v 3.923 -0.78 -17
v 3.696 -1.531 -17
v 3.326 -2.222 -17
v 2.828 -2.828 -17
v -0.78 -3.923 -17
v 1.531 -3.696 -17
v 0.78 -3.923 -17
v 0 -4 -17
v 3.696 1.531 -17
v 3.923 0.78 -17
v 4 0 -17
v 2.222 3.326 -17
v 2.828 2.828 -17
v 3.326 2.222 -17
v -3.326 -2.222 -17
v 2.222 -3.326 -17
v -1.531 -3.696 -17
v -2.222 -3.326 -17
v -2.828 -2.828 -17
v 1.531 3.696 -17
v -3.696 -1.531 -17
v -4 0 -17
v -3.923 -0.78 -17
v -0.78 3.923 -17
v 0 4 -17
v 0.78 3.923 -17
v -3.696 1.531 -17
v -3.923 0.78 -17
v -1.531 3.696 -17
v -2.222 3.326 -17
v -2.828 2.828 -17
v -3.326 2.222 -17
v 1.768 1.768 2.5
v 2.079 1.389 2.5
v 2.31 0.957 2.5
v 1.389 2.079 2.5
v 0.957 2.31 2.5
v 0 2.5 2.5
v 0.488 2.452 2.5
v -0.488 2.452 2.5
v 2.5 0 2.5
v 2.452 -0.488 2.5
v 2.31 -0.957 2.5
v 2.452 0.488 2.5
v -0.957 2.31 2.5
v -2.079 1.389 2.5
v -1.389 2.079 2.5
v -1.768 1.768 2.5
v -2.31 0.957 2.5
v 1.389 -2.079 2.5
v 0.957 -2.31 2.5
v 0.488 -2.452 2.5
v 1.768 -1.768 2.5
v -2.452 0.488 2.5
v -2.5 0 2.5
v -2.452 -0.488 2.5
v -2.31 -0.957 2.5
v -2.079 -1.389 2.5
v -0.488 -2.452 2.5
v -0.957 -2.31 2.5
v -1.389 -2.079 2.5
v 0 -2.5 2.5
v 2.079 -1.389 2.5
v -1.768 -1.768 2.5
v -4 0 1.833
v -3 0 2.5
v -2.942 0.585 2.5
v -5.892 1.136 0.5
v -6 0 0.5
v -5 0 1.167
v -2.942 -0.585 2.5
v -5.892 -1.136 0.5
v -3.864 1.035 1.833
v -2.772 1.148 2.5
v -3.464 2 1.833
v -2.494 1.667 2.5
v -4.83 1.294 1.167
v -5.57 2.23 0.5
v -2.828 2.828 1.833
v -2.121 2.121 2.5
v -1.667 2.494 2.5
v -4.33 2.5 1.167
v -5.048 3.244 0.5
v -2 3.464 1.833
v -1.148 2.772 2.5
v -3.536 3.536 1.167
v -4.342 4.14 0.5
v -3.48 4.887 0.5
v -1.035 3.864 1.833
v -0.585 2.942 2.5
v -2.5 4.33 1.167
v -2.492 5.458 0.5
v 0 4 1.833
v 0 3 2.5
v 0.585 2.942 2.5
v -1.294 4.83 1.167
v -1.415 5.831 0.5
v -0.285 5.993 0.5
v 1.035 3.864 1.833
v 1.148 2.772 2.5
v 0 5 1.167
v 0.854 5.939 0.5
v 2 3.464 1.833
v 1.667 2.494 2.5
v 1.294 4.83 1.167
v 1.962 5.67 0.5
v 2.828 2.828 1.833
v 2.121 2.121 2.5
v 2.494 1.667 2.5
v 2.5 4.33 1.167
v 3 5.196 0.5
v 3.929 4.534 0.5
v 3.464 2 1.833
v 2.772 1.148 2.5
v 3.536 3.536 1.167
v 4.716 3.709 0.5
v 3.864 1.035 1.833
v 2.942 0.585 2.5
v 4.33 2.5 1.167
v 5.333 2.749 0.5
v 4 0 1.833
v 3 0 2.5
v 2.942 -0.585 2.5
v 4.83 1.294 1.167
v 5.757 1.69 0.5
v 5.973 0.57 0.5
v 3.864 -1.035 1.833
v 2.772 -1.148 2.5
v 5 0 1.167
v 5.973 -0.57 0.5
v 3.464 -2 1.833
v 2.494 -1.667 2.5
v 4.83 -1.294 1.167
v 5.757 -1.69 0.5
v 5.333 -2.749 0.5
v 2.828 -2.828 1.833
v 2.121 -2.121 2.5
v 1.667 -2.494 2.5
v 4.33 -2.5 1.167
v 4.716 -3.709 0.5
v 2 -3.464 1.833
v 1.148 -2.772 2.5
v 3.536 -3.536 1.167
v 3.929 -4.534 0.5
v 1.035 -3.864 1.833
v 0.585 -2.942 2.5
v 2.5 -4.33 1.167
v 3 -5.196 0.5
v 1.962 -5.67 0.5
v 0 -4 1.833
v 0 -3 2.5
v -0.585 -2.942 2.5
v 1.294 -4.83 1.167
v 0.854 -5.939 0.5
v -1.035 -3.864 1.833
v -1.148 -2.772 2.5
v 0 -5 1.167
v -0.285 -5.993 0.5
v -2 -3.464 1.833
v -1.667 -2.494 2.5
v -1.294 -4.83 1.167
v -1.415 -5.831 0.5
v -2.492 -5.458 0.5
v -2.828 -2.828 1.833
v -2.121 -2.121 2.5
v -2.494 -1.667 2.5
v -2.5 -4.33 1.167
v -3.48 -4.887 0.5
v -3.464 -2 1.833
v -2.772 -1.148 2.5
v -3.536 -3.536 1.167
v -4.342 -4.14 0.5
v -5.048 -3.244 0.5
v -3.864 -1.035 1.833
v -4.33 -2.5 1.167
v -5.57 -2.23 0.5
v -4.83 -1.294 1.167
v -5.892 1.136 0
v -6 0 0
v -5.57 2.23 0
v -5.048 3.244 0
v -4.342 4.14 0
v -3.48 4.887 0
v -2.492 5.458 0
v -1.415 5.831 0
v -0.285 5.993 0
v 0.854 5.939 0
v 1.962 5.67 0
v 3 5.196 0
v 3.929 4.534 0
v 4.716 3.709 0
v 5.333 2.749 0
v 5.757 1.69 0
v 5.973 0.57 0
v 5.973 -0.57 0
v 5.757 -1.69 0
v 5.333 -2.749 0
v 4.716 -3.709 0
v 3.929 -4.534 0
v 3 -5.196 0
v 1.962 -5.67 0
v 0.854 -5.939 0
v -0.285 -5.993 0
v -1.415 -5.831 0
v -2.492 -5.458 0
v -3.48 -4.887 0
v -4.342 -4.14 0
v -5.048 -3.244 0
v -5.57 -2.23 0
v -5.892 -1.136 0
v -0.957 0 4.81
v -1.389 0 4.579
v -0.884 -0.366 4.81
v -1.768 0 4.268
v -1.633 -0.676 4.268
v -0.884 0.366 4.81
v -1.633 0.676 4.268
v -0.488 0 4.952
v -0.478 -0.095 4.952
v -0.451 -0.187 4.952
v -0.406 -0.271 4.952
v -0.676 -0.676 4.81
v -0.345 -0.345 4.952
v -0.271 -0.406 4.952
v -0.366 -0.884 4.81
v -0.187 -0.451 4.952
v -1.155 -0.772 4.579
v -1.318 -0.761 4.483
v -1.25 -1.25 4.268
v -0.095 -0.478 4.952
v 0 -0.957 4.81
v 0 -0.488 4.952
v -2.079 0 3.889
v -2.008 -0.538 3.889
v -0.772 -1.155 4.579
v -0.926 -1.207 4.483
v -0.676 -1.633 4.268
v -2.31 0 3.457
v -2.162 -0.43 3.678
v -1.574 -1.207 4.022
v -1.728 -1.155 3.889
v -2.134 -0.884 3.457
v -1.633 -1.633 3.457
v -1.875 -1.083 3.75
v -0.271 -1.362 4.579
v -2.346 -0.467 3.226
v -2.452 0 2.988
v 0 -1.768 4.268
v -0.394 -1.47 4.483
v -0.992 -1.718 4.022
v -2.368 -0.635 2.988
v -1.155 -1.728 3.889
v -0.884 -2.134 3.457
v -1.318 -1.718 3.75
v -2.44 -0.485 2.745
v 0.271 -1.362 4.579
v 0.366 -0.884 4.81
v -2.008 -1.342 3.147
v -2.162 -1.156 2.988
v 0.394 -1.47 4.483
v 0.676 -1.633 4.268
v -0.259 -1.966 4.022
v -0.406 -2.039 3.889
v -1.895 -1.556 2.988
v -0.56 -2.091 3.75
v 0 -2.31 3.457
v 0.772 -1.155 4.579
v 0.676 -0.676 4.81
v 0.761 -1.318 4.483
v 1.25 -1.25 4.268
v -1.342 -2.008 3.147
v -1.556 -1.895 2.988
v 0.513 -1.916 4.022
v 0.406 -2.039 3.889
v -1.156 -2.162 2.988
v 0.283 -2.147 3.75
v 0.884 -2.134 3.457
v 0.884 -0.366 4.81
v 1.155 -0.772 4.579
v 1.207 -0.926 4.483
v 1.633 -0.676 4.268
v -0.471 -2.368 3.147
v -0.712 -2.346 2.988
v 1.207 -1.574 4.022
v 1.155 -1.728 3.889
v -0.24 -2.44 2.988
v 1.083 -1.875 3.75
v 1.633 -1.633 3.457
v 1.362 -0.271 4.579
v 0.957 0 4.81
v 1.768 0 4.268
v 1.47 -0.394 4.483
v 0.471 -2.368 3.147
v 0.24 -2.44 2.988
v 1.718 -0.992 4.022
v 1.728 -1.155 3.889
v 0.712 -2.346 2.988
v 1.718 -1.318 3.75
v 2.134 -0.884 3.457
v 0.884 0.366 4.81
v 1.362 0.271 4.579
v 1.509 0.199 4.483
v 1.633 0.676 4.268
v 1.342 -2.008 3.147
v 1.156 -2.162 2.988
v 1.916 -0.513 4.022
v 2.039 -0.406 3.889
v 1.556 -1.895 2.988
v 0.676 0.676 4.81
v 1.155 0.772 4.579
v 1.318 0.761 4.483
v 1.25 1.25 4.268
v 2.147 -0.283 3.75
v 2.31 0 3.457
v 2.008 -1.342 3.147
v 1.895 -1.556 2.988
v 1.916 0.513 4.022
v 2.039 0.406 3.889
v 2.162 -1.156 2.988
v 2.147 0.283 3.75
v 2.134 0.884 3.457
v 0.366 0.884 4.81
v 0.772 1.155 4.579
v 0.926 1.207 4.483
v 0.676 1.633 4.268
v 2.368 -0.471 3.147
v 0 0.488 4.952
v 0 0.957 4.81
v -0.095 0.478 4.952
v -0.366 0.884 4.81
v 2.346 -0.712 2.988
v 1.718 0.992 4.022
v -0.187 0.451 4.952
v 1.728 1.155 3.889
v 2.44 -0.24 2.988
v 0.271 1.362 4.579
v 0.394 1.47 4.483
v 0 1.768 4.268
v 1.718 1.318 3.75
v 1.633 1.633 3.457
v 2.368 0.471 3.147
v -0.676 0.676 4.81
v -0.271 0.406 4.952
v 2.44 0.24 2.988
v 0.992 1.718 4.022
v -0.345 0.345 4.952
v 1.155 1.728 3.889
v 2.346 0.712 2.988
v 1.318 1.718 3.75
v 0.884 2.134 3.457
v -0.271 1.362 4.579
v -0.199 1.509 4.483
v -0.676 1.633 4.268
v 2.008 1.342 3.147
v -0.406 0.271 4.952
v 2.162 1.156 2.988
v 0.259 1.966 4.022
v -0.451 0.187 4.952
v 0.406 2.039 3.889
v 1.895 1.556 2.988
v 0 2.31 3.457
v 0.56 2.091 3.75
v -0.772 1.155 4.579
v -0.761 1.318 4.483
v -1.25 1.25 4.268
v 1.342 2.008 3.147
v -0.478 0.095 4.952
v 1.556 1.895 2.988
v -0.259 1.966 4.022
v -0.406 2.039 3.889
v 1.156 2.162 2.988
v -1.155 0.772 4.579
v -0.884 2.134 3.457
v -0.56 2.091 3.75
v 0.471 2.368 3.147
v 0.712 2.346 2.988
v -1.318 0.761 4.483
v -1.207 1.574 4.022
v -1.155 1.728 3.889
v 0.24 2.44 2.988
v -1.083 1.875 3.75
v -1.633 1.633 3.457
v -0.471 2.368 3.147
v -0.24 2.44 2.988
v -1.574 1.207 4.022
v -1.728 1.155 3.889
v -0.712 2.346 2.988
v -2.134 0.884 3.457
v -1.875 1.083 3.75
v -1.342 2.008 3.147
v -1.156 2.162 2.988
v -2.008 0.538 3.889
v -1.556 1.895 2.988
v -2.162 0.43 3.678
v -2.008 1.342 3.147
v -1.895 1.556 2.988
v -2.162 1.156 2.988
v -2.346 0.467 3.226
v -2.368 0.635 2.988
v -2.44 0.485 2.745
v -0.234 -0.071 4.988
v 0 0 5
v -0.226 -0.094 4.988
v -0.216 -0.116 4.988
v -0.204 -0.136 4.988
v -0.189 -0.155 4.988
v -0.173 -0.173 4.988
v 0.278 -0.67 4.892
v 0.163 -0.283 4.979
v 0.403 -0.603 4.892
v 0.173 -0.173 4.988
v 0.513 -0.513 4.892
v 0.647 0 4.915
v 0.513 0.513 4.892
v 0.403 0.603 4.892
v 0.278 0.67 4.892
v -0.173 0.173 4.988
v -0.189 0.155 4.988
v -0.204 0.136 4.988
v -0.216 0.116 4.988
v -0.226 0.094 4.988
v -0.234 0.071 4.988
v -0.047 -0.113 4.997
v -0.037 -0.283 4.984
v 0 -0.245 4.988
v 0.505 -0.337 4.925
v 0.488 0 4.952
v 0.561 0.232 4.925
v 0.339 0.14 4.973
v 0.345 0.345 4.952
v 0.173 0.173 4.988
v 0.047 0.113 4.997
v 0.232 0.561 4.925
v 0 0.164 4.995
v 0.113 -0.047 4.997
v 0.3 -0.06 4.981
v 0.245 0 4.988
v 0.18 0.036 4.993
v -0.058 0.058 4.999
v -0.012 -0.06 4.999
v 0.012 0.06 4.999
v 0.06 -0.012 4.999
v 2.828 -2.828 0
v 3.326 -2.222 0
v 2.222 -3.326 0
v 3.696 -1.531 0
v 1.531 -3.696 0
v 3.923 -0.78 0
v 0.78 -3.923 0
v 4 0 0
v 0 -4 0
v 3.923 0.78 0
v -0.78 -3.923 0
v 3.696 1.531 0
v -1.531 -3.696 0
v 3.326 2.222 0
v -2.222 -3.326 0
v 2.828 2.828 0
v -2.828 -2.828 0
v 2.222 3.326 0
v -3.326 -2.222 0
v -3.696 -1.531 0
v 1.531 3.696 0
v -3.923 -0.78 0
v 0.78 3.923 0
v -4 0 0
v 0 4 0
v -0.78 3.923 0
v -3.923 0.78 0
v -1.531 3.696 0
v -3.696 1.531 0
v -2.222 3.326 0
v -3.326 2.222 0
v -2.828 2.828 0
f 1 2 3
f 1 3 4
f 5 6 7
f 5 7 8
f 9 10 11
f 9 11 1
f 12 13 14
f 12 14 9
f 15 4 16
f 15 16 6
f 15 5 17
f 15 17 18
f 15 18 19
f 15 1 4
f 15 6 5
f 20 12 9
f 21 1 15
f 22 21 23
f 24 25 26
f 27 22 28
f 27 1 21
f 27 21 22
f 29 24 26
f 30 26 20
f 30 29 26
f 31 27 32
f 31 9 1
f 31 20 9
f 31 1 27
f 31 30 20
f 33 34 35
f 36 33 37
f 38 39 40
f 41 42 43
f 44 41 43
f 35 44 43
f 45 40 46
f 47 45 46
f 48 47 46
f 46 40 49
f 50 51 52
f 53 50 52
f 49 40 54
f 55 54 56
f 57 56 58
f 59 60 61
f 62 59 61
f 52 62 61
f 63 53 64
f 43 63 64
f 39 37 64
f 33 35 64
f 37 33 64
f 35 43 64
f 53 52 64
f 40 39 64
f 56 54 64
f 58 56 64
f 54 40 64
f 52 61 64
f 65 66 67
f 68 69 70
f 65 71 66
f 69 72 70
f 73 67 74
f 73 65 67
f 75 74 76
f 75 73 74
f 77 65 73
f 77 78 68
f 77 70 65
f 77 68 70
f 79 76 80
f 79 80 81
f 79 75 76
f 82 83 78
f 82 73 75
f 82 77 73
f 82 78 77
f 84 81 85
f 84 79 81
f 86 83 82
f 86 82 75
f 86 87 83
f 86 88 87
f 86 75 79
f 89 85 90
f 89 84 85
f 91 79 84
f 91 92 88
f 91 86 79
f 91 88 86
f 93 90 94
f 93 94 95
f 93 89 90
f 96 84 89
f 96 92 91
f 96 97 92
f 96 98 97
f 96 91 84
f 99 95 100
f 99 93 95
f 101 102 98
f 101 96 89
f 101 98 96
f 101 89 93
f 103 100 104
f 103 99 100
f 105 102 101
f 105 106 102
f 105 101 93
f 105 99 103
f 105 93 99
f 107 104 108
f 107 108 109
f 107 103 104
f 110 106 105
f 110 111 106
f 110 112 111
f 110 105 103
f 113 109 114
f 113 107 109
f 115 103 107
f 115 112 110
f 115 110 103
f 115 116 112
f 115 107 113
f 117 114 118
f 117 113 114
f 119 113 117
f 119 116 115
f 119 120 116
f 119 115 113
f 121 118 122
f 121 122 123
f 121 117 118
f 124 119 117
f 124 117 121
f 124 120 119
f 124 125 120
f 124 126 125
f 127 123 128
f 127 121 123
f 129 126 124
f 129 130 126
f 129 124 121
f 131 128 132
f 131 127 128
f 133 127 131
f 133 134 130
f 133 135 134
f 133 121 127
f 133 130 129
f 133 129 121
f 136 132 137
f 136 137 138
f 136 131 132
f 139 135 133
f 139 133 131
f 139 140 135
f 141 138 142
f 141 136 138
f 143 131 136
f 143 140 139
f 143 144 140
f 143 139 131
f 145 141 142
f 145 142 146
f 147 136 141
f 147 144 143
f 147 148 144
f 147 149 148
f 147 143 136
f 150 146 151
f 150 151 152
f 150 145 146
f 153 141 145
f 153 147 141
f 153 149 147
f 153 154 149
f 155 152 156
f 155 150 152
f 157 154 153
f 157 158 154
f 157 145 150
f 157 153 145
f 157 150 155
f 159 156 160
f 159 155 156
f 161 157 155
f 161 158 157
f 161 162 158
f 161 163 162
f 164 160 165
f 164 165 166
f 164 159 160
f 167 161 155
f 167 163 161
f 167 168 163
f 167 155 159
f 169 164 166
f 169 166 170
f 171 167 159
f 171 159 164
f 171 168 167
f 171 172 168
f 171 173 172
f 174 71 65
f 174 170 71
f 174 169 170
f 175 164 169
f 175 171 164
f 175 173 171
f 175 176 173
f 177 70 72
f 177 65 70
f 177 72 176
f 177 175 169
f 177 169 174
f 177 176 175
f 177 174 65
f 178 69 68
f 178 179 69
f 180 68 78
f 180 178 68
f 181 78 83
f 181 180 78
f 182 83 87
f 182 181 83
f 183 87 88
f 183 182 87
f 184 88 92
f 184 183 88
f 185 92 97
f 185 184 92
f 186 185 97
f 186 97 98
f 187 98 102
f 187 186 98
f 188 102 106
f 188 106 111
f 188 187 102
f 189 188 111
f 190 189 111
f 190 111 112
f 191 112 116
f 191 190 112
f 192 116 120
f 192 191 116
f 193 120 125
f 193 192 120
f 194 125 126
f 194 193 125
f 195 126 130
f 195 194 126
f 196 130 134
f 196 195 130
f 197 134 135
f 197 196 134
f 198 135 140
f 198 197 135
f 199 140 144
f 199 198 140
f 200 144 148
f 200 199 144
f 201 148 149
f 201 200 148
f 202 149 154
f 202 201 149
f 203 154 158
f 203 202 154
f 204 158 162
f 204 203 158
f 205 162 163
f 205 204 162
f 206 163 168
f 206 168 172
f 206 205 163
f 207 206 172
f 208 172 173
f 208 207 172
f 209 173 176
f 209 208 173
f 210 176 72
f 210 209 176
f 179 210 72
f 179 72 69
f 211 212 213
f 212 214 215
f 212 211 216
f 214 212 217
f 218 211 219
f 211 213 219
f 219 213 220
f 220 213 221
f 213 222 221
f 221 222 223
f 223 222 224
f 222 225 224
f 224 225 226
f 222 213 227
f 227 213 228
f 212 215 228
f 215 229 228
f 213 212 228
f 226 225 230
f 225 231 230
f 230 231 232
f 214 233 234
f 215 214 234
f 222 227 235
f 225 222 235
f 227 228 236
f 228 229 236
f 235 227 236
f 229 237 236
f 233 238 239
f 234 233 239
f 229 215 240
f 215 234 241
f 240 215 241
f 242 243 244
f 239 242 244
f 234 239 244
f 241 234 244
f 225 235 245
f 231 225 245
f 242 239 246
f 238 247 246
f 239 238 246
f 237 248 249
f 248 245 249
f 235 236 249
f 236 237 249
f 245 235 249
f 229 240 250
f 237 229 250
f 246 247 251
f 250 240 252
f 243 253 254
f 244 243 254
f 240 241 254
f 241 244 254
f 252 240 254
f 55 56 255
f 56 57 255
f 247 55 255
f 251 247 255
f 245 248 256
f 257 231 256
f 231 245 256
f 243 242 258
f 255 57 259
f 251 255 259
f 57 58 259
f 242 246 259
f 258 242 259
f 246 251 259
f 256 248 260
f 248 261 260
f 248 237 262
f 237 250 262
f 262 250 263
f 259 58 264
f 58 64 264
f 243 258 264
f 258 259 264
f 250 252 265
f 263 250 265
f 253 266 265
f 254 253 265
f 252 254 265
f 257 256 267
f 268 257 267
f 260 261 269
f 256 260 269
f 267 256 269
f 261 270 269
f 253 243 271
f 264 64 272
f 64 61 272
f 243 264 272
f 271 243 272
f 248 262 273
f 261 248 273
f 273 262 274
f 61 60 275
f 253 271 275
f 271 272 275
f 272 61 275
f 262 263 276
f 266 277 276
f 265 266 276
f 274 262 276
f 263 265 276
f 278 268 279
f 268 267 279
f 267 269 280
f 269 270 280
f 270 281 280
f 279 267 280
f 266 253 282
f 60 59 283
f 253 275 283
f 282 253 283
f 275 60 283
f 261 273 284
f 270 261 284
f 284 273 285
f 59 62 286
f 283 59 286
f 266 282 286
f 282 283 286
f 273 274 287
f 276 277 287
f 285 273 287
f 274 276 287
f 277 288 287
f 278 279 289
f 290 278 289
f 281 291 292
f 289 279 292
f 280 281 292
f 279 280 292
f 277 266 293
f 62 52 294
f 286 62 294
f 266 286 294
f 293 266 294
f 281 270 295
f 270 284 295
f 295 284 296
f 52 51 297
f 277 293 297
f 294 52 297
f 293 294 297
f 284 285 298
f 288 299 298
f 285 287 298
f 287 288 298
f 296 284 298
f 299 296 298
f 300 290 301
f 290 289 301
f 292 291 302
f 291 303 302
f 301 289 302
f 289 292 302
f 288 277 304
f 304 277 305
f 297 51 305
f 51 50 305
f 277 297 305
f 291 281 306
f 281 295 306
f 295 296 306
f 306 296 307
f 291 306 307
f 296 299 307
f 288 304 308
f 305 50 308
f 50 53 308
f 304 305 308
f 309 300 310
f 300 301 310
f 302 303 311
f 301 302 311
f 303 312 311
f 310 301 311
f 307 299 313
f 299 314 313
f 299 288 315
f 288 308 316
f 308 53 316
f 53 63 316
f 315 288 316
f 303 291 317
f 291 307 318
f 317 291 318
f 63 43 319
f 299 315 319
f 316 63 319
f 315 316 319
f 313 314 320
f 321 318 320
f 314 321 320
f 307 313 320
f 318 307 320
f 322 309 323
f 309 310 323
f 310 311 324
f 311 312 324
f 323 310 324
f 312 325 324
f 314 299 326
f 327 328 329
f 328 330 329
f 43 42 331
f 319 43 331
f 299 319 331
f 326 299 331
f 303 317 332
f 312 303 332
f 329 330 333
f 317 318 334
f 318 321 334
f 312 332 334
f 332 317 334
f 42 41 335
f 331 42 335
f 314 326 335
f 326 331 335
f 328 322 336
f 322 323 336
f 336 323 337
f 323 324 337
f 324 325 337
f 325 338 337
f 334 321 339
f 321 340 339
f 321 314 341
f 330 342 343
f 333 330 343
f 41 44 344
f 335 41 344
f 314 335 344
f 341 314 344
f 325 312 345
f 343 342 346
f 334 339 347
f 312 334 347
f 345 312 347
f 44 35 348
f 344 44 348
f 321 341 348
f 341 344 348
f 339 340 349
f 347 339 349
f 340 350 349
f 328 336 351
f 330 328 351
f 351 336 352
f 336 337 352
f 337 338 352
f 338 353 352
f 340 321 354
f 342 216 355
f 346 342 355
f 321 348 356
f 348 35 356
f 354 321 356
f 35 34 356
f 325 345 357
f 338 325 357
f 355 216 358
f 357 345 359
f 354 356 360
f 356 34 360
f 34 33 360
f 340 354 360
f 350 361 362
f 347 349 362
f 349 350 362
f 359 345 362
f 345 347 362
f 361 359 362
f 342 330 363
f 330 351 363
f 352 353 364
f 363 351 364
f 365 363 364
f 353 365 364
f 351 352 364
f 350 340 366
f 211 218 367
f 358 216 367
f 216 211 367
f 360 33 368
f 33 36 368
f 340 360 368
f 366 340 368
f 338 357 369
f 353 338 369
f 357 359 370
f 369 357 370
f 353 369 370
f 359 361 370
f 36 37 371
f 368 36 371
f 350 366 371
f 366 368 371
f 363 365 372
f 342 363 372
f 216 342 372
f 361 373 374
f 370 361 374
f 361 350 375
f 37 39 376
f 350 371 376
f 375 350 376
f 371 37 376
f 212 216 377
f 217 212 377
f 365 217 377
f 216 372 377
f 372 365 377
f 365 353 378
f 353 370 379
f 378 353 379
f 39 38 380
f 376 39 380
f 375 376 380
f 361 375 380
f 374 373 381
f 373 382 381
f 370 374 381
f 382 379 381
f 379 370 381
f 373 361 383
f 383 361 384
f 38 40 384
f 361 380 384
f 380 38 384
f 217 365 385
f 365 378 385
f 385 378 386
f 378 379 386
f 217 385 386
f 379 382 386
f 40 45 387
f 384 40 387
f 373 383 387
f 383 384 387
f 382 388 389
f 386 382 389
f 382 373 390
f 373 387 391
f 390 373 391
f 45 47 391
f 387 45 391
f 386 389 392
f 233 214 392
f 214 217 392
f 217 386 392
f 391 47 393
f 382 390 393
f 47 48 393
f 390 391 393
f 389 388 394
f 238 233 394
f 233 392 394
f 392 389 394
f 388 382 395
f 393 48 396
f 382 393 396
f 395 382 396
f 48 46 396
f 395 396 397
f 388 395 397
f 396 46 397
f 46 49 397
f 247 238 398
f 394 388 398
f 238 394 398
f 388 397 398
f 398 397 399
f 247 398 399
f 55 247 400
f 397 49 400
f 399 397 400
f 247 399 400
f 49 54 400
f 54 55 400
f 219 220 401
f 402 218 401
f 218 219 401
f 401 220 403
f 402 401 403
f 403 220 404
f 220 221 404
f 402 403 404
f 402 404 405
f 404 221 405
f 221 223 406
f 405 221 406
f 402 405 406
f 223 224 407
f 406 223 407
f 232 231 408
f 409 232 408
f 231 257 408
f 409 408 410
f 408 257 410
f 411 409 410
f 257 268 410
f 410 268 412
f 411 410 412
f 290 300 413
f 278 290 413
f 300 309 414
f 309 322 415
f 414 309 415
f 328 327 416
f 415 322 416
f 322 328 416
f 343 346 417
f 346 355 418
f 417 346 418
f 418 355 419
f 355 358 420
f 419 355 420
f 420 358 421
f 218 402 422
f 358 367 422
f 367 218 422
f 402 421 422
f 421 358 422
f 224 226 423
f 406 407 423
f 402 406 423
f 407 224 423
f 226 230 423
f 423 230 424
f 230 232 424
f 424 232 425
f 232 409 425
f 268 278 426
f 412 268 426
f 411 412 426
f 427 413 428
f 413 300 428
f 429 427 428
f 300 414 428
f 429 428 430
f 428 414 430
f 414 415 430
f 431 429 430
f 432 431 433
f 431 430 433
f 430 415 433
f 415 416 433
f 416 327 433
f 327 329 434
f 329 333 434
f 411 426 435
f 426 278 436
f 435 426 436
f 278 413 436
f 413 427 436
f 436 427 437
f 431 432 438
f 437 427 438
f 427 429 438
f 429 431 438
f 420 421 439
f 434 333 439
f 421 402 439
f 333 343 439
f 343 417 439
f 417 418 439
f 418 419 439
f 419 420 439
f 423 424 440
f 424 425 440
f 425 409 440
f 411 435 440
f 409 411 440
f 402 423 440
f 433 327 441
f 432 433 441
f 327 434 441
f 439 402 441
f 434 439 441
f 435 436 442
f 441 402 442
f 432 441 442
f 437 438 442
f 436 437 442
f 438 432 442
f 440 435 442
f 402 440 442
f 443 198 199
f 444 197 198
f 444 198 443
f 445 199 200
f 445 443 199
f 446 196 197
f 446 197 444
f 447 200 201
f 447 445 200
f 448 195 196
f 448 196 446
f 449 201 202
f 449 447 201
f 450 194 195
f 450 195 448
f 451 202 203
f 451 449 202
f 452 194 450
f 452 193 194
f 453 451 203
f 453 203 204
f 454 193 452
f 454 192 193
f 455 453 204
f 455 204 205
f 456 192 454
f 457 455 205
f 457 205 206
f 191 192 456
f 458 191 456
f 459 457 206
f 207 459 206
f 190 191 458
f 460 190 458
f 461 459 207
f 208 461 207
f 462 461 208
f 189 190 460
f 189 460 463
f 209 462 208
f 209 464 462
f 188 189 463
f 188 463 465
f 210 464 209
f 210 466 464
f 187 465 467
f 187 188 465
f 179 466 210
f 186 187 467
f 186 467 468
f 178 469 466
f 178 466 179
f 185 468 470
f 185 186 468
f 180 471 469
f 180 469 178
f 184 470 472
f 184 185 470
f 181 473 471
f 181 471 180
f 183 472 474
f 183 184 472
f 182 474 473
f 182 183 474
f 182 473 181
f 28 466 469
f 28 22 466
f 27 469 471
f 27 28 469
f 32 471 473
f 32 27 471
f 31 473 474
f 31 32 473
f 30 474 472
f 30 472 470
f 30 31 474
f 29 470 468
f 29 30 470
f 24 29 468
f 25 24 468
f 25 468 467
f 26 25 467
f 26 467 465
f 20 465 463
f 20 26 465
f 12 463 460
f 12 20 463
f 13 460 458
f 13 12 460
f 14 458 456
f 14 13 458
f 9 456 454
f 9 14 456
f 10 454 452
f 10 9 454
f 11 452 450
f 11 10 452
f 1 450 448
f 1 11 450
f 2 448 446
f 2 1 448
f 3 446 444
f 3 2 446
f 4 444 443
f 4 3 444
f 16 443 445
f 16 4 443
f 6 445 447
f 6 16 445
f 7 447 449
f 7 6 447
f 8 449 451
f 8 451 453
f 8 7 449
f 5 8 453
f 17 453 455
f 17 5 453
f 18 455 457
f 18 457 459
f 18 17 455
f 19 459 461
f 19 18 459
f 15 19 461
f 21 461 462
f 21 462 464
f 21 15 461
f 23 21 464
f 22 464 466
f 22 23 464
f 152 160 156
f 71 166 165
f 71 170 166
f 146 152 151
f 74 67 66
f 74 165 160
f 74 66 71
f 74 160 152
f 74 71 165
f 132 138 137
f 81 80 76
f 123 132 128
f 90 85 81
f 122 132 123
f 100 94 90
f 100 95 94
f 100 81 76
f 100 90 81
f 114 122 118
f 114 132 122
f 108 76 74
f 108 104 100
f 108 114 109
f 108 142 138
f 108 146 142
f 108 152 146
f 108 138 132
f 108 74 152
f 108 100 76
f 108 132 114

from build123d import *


with BuildPart() as f1:
    # F0 (on Front) → F1 (revolve)
    with BuildSketch(Plane.XZ):
        Polygon((0, -17), (0, 2.5), (-3, 2.5), (-6, 0.5), (-6, 0), (-4, 0), (-4, -17), align=None)
    revolve(axis=Axis((0, 0, -7.25), (0, 0, -1)))


with BuildPart() as f3:
    # F2 (on Front) → F3 (revolve)
    with BuildSketch(Plane.XZ):
        with BuildLine():
            Line((-2.5, 2.5), (0, 2.5))
            Line((0, 2.5), (0, 5))
            ThreePointArc((0, 5), (-1.767767, 4.267767), (-2.5, 2.5))
        make_face()
    revolve(axis=Axis((0, 0, 3.75), (0, 0, 1)))


solid = Compound([f1.part, f3.part])
